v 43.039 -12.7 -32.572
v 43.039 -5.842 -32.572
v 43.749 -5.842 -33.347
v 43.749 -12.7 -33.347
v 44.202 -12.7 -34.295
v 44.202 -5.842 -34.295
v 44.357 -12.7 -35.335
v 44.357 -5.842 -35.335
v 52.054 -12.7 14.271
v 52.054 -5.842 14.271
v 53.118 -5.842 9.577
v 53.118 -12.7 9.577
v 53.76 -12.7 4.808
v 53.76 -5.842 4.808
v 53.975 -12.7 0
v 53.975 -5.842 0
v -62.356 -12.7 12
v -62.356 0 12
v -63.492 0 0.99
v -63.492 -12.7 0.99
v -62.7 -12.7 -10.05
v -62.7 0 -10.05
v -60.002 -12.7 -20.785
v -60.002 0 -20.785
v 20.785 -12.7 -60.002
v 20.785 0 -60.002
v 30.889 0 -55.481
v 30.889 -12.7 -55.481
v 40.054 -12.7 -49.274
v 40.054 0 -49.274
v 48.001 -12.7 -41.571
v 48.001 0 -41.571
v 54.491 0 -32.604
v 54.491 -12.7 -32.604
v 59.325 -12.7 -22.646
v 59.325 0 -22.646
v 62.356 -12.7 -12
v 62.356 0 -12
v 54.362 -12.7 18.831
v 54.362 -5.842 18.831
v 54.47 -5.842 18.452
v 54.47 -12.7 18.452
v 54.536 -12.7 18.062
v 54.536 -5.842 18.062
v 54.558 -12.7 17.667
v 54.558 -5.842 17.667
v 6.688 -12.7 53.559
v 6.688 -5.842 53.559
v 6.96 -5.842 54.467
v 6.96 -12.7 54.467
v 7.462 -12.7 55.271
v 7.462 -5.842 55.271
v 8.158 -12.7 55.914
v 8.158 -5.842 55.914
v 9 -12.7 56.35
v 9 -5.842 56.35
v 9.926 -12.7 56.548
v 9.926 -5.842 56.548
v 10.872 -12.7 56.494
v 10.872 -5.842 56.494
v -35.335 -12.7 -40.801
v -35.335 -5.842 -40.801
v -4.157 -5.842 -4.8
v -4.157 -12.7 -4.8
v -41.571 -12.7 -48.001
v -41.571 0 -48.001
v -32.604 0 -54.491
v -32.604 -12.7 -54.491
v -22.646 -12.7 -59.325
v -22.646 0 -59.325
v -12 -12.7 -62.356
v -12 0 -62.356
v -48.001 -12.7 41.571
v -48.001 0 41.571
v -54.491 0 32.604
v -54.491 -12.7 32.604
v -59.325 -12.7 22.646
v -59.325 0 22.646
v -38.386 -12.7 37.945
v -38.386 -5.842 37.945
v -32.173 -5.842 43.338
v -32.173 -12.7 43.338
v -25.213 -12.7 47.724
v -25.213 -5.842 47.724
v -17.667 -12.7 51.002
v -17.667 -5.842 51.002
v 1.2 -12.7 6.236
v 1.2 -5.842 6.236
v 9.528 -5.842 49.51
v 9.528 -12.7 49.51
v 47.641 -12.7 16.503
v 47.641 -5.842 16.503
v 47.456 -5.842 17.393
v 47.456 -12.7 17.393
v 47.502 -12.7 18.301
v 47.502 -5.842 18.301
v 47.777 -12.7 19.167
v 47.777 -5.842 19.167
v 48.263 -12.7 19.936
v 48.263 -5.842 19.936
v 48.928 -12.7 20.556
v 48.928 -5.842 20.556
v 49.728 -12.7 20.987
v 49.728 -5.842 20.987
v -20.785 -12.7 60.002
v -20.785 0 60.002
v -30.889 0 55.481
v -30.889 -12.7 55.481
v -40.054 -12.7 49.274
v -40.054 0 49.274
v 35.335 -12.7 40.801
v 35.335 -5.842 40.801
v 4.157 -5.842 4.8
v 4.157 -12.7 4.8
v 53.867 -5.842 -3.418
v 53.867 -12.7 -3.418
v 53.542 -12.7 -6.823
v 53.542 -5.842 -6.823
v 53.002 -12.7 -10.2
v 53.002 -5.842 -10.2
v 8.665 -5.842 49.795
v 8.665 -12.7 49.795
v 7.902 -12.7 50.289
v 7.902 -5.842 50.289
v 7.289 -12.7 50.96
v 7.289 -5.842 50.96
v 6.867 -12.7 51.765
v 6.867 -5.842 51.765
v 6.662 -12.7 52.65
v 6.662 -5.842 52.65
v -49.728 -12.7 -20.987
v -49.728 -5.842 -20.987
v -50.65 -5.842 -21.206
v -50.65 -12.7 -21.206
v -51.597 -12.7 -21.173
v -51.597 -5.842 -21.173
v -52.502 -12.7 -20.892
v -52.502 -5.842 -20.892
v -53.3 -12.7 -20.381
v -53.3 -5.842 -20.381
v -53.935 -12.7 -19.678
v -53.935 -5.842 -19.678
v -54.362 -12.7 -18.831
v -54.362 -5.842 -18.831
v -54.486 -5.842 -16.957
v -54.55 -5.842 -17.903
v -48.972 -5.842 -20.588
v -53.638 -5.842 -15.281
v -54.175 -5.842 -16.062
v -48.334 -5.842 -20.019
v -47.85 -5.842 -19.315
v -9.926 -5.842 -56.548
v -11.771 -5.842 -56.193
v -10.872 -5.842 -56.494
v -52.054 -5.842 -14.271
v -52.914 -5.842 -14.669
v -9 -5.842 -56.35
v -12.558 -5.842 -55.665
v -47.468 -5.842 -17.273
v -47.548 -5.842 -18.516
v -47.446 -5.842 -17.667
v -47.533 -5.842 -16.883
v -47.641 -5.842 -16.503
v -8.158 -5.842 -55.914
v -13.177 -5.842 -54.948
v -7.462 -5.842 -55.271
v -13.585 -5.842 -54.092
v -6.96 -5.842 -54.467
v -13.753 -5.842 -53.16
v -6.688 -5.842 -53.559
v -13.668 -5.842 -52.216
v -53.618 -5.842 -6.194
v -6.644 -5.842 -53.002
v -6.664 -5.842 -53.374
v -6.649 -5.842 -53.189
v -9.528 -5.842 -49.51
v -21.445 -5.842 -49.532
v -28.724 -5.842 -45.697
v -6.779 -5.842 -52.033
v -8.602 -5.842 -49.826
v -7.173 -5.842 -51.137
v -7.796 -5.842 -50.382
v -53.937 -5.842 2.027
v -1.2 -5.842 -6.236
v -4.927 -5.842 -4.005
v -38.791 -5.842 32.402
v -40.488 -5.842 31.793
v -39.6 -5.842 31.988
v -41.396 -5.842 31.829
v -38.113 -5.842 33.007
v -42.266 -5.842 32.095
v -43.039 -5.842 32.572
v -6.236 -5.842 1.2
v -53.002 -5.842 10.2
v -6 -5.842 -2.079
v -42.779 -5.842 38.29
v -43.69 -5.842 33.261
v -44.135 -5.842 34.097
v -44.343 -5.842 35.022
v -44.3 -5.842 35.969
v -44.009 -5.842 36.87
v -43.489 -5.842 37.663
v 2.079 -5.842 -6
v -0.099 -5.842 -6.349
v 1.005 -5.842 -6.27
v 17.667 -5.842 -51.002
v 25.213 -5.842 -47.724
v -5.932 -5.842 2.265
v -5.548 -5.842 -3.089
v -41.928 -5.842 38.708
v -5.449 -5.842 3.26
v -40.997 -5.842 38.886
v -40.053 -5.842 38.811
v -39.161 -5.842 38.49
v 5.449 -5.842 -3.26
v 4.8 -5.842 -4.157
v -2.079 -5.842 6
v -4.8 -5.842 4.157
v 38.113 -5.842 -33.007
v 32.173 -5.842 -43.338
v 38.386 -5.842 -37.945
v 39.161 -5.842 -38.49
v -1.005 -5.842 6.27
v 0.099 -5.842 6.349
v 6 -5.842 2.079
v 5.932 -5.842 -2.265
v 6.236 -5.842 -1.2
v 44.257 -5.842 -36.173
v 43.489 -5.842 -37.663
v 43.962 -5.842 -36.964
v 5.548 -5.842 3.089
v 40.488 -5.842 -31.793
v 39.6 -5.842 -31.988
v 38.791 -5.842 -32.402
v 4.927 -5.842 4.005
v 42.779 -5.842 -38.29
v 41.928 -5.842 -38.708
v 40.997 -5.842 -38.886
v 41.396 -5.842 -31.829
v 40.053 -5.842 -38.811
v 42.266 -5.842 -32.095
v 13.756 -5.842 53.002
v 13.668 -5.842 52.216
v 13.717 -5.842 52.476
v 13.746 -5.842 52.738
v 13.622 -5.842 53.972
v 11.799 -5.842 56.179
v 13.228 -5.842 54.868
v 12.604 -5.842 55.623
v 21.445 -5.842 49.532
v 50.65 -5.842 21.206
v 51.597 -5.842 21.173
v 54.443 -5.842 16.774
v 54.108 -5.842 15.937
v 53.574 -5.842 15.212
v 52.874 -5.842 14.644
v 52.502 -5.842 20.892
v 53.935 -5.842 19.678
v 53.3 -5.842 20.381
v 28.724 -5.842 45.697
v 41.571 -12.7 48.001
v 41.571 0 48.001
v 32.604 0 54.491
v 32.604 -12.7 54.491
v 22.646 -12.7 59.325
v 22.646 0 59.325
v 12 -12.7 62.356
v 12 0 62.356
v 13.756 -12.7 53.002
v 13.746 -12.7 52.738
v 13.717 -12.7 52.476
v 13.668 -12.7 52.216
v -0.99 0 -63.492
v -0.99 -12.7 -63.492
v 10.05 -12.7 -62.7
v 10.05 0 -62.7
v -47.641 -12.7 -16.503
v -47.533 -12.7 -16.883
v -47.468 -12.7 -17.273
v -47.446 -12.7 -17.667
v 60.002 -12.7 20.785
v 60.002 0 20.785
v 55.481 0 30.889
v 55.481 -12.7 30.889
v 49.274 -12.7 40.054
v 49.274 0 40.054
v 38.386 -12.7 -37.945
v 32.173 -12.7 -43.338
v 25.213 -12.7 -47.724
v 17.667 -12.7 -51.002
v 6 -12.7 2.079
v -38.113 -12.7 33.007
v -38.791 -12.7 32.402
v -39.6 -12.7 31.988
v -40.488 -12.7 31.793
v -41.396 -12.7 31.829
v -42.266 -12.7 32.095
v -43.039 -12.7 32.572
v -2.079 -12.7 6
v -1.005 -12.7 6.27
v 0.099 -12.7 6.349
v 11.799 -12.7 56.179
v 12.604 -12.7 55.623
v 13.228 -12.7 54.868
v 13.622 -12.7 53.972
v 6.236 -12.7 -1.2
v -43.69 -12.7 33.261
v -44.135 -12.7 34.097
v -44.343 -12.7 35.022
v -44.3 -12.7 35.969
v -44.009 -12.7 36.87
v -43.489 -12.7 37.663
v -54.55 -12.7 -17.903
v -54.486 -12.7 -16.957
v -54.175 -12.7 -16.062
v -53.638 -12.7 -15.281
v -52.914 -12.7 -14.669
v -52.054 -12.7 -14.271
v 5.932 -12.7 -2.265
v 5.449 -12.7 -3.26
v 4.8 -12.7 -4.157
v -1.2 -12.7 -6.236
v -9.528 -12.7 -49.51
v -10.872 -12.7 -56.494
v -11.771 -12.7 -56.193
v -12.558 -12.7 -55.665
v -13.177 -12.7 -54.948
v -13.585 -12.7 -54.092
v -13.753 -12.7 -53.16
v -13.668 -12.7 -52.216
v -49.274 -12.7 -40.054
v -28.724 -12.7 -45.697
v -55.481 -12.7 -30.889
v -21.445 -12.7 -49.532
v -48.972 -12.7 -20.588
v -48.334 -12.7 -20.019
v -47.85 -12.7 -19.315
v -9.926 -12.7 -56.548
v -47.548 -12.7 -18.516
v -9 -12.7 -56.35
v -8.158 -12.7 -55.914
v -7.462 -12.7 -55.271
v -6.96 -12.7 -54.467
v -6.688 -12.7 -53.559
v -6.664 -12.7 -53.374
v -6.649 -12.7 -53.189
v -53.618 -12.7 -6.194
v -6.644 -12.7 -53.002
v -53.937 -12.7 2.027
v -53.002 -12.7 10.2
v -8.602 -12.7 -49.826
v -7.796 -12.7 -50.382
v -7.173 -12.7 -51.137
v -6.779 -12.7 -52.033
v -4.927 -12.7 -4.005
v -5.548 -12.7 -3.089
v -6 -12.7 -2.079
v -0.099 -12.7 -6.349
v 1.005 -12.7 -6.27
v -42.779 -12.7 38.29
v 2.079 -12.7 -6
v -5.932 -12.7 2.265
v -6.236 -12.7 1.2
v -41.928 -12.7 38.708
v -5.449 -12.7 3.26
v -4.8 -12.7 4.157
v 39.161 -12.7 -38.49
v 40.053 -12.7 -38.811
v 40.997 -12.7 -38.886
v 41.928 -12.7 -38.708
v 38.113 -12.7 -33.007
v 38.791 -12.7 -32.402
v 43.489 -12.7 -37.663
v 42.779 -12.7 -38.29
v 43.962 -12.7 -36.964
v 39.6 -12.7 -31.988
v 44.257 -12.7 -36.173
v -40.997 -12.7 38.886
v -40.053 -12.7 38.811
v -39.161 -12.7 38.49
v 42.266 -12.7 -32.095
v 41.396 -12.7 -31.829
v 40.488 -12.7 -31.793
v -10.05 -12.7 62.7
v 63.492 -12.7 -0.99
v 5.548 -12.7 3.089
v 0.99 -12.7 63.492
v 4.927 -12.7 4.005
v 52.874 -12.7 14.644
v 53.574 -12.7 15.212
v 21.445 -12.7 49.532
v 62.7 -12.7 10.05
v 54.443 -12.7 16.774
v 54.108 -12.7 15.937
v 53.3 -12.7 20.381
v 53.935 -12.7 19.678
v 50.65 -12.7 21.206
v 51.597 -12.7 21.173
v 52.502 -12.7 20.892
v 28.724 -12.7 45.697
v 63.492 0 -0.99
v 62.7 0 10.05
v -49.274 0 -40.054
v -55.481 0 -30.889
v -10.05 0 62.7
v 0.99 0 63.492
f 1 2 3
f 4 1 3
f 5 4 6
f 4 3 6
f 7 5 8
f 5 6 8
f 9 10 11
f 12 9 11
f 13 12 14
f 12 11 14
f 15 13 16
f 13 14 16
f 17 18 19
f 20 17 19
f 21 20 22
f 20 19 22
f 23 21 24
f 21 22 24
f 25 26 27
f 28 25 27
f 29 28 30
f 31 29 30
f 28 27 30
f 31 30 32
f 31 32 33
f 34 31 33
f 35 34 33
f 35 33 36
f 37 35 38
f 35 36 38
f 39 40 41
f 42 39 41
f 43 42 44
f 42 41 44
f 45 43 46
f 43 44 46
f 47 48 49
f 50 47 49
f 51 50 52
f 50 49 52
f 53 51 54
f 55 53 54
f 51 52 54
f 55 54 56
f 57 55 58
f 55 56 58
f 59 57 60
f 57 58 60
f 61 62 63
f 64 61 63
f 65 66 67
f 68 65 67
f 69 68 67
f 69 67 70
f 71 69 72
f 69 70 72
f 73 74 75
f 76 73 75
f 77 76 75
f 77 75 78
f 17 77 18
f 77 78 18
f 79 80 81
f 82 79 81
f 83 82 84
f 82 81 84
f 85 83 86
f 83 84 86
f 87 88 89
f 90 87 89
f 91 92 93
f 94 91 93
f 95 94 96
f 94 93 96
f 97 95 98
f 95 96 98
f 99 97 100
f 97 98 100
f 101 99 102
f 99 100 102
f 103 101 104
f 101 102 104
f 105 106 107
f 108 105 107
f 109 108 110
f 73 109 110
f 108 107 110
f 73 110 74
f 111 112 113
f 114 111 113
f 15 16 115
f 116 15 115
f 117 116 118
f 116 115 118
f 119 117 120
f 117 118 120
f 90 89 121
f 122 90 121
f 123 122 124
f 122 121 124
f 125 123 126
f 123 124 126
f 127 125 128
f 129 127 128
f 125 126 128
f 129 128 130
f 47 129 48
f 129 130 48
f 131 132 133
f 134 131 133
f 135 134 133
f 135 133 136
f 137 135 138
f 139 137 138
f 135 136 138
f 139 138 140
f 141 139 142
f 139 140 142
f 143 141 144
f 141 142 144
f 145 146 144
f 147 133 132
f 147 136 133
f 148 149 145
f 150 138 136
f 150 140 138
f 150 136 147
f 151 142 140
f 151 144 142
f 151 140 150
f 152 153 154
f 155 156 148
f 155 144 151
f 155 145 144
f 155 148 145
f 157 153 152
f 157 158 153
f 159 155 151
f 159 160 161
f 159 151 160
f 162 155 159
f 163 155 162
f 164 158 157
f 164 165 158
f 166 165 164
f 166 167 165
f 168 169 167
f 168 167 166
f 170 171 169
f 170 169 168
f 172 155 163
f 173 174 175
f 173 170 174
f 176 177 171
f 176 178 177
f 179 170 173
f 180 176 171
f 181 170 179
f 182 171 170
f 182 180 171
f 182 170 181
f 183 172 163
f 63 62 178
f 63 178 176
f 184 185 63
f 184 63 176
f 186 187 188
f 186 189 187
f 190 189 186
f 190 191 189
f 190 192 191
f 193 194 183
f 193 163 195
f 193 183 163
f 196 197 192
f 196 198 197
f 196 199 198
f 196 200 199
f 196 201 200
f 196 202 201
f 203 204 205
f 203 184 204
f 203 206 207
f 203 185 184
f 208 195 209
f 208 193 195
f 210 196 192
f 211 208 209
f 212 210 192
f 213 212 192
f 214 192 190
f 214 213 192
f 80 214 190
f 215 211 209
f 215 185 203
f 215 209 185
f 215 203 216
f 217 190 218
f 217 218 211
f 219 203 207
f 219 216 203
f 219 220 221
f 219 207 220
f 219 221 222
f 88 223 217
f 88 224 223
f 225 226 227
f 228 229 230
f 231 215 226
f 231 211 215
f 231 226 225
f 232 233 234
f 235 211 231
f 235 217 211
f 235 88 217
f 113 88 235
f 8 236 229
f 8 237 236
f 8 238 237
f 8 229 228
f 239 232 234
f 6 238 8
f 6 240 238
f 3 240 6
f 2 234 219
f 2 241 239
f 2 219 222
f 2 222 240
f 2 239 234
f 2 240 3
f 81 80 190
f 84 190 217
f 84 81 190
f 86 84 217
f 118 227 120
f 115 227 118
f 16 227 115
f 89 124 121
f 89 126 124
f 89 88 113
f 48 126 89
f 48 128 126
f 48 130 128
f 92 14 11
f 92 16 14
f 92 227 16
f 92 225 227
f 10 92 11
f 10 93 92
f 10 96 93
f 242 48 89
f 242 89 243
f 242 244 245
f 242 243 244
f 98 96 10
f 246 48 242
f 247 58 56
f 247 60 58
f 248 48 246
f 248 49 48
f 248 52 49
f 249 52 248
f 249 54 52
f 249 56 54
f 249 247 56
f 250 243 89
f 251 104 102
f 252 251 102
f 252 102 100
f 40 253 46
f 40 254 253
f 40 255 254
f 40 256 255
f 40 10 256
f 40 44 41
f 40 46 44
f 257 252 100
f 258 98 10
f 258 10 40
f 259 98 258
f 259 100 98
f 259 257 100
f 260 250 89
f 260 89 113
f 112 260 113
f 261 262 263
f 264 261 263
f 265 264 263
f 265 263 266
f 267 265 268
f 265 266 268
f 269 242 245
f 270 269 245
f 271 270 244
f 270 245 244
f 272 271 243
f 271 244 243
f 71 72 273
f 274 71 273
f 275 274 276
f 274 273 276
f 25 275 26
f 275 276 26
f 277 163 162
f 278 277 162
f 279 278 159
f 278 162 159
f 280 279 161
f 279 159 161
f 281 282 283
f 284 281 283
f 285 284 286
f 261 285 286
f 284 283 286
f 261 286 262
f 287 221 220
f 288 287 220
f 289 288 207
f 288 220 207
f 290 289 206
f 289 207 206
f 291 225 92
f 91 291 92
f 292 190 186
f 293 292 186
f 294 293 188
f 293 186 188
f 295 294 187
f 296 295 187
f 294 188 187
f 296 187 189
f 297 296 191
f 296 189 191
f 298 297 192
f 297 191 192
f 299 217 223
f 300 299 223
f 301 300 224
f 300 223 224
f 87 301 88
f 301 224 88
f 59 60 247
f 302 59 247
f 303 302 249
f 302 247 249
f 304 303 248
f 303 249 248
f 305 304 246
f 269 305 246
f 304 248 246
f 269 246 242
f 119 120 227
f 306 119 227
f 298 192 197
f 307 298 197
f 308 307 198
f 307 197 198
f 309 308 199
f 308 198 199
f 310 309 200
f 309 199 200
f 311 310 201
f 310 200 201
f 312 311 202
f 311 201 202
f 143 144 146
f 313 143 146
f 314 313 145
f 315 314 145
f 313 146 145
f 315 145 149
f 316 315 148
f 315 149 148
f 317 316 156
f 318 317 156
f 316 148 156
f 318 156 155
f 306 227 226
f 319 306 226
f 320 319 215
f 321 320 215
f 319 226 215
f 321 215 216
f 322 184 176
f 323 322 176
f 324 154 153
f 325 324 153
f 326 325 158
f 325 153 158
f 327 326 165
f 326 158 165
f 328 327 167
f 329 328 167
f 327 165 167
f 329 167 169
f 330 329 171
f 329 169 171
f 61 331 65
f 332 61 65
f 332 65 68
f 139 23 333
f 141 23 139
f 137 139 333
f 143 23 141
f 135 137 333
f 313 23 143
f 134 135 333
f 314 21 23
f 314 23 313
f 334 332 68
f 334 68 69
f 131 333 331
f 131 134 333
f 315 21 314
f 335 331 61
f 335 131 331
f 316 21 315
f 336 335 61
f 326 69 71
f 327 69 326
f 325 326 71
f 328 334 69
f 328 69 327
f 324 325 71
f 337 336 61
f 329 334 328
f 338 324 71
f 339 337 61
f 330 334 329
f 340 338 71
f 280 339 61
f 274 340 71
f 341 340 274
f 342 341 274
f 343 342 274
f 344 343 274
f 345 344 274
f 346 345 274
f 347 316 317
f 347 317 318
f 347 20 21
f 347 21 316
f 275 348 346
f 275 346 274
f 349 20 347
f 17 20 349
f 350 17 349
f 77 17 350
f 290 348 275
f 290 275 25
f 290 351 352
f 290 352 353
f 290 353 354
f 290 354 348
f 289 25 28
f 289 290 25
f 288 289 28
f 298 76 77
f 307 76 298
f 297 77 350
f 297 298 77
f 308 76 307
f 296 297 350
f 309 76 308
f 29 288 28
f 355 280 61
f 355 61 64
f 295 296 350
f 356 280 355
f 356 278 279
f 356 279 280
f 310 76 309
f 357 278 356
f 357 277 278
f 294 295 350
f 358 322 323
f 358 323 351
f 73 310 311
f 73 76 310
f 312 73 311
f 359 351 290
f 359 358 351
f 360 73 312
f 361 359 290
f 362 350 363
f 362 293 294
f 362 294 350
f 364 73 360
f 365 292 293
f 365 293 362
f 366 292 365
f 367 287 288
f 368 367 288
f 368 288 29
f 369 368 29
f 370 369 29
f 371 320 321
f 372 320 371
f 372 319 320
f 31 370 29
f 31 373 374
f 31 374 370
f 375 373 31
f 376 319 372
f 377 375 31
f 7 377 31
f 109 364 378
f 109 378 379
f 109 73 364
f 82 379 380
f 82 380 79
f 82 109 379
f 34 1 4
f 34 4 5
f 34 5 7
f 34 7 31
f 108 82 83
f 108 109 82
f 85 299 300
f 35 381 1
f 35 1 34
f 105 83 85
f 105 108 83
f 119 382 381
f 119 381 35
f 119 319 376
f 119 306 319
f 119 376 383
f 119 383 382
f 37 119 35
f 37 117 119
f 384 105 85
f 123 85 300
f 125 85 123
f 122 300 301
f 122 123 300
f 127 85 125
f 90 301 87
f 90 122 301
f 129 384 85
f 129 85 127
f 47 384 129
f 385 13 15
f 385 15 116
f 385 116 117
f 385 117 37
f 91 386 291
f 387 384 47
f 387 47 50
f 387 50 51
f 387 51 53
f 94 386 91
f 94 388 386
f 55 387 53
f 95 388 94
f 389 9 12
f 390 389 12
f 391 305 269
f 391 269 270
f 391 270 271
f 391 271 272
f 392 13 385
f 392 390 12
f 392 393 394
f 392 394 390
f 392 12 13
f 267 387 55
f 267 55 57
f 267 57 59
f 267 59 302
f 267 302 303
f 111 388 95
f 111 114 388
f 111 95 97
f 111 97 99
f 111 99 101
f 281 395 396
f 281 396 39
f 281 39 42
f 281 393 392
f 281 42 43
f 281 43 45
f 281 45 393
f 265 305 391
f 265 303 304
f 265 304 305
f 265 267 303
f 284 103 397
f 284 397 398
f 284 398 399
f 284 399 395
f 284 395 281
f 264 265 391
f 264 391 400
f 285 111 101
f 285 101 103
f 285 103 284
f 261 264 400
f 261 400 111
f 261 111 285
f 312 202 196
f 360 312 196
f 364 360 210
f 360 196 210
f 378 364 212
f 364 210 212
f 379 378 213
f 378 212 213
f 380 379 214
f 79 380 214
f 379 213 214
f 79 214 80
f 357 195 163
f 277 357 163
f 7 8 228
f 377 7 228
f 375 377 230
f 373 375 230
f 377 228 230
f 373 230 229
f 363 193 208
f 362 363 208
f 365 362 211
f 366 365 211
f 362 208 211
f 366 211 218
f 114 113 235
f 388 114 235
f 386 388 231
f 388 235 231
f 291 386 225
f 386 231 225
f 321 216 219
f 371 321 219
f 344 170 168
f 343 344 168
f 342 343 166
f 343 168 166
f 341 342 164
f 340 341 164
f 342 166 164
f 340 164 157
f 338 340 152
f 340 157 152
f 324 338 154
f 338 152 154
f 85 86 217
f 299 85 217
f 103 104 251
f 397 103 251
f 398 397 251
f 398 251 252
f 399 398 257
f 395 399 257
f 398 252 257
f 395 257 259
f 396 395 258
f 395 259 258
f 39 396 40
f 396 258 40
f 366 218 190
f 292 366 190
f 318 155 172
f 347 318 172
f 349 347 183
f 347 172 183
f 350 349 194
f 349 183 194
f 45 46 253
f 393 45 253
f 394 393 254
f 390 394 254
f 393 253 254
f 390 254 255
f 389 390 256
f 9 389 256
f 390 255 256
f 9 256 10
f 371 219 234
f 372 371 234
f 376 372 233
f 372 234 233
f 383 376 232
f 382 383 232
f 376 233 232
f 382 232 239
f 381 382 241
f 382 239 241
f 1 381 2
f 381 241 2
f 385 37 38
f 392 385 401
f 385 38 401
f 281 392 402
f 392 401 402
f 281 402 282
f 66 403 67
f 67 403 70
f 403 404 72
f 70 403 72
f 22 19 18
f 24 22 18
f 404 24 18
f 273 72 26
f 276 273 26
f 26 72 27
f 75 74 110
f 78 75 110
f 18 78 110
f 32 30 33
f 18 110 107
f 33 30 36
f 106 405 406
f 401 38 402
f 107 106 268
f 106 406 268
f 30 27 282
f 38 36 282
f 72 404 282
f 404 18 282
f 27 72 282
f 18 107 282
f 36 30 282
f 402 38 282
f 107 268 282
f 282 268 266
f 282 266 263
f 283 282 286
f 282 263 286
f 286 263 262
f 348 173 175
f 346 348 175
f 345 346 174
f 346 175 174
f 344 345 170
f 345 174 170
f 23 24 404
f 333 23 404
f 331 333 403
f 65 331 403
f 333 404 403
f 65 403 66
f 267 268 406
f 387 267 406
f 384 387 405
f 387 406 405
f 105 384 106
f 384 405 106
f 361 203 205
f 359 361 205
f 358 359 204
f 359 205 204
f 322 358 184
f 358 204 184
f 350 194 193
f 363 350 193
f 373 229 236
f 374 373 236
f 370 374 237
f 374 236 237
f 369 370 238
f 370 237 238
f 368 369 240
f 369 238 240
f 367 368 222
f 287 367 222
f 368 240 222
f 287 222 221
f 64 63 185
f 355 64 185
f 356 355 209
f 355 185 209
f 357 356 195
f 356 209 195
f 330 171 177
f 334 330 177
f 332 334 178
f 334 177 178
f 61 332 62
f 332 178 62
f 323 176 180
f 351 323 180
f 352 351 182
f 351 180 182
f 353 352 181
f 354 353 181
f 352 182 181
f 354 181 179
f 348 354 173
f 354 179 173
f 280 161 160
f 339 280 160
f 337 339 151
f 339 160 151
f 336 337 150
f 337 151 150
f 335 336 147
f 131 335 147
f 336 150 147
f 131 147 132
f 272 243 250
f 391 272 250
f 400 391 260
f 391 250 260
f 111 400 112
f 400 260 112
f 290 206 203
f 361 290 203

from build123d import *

# Parameters (mm, degrees)
F1_DEPTH = 12.7
F2_R     = 63.5
F3_DEPTH = 5.842


# Not quite as in the source:
# - a feature names something its author has since deleted; it is built from what else it names


with BuildPart() as f1:
    # F0 (on Front) → F1 (new body)
    with BuildSketch(Plane.XZ):
        with BuildLine():
            Line((54.3616852417, 18.8314401648), (60.0018600902, 20.785254045))
            ThreePointArc((60.0018600902, 20.785254045), (52.5777266824, 35.6066378209), (41.57050809, 48.0014880722))
            Line((41.57050809, 48.0014880722), (35.3349318765, 40.8012648613))
            ThreePointArc((35.3349318765, 40.8012648613), (43.6698276291, 31.7213930943), (49.7275527638, 20.9874038681))
            ThreePointArc((49.7275527638, 20.9874038681), (52.5015720726, 20.8916190072), (54.3616852417, 18.8314401648))
        make_face()
        with BuildLine():
            Line((35.3349318765, 40.8012648613), (41.57050809, 48.0014880722))
            ThreePointArc((41.57050809, 48.0014880722), (27.7303280697, 57.1251162375), (12.000372018, 62.3557621349))
            Line((12.000372018, 62.3557621349), (10.8723370483, 56.4943204943))
            ThreePointArc((10.8723370483, 56.4943204943), (12.9421077904, 55.2668436539), (13.7563162153, 53.0023978147))
            ThreePointArc((13.7563162153, 53.0023978147), (13.7342201731, 52.6065963274), (13.6682066443, 52.2157136514))
            ThreePointArc((13.6682066443, 52.2157136514), (25.1574900679, 47.7535477057), (35.3349318765, 40.8012648613))
        make_face()
        with BuildLine():
            Line((10.8723370483, 56.4943204943), (12.000372018, 62.3557621349))
            ThreePointArc((12.000372018, 62.3557621349), (-4.5473895551, 63.3369658907), (-20.785254045, 60.0018600902))
            Line((-20.785254045, 60.0018600902), (-17.6674659382, 51.0015810767))
            ThreePointArc((-17.6674659382, 51.0015810767), (-5.6366184485, 53.6798766529), (6.6881514727, 53.5590258955))
            ThreePointArc((6.6881514727, 53.5590258955), (8.1581132499, 55.9135046571), (10.8723370483, 56.4943204943))
        make_face()
        with BuildLine():
            Line((-17.6674659382, 51.0015810767), (-20.785254045, 60.0018600902))
            ThreePointArc((-20.785254045, 60.0018600902), (-35.6066378209, 52.5777266824), (-48.0014880722, 41.57050809))
            Line((-48.0014880722, 41.57050809), (-43.4893481934, 37.6628803295))
            ThreePointArc((-43.4893481934, 37.6628803295), (-40.9974571589, 38.8855155725), (-38.3860311767, 37.9448710039))
            ThreePointArc((-38.3860311767, 37.9448710039), (-28.7770404, 45.6637993471), (-17.6674659382, 51.0015810767))
        make_face()
        with BuildLine():
            Line((-43.4893481934, 37.6628803295), (-48.0014880722, 41.57050809))
            ThreePointArc((-48.0014880722, 41.57050809), (-57.1251162375, 27.7303280697), (-62.3557621349, 12.000372018))
            Line((-62.3557621349, 12.000372018), (-53.0023978147, 10.2003162153))
            ThreePointArc((-53.0023978147, 10.2003162153), (-49.3064460776, 21.9584835586), (-43.0394012911, 32.5716220275))
            ThreePointArc((-43.0394012911, 32.5716220275), (-44.3434588227, 35.0218856499), (-43.4893481934, 37.6628803295))
        make_face()
        with BuildLine():
            Line((-53.0023978147, 10.2003162153), (-62.3557621349, 12.000372018))
            ThreePointArc((-62.3557621349, 12.000372018), (-63.3369658907, -4.5473895551), (-60.0018600902, -20.785254045))
            Line((-60.0018600902, -20.785254045), (-54.3616852417, -18.8314401648))
            ThreePointArc((-54.3616852417, -18.8314401648), (-54.1745729045, -16.062081604), (-52.054237821, -14.2708426476))
            ThreePointArc((-52.054237821, -14.2708426476), (-53.9345304679, -2.0897483586), (-53.0023978147, 10.2003162153))
        make_face()
        with BuildLine():
            ThreePointArc((-60.0018600902, -20.785254045), (-52.5777266824, -35.6066378209), (-41.57050809, -48.0014880722))
            Line((-41.57050809, -48.0014880722), (-35.3349318765, -40.8012648613))
            ThreePointArc((-35.3349318765, -40.8012648613), (-43.6698276292, -31.7213930943), (-49.7275527638, -20.9874038681))
            ThreePointArc((-49.7275527638, -20.9874038681), (-52.5015720726, -20.8916190072), (-54.3616852417, -18.8314401648))
            Line((-54.3616852417, -18.8314401648), (-60.0018600902, -20.785254045))
        make_face()
        with BuildLine():
            ThreePointArc((-41.57050809, -48.0014880722), (-27.7303280697, -57.1251162375), (-12.000372018, -62.3557621349))
            Line((-12.000372018, -62.3557621349), (-10.8723370483, -56.4943204943))
            ThreePointArc((-10.8723370483, -56.4943204943), (-13.1771157456, -54.9475971764), (-13.6682066443, -52.2157136514))
            ThreePointArc((-13.6682066443, -52.2157136514), (-25.1574900679, -47.7535477057), (-35.3349318765, -40.8012648613))
            Line((-35.3349318765, -40.8012648613), (-41.57050809, -48.0014880722))
        make_face()
        with BuildLine():
            ThreePointArc((-12.000372018, -62.3557621349), (4.5473895551, -63.3369658907), (20.785254045, -60.0018600902))
            Line((20.785254045, -60.0018600902), (17.6674659382, -51.0015810767))
            ThreePointArc((17.6674659382, -51.0015810767), (5.6366184485, -53.6798766529), (-6.6881514727, -53.5590258955))
            ThreePointArc((-6.6881514727, -53.5590258955), (-8.1581132499, -55.9135046571), (-10.8723370483, -56.4943204943))
            Line((-10.8723370483, -56.4943204943), (-12.000372018, -62.3557621349))
        make_face()
        with BuildLine():
            ThreePointArc((20.785254045, -60.0018600902), (35.6066378209, -52.5777266824), (48.0014880722, -41.57050809))
            Line((48.0014880722, -41.57050809), (43.4893481934, -37.6628803295))
            ThreePointArc((43.4893481934, -37.6628803295), (40.9974571589, -38.8855155725), (38.3860311767, -37.9448710039))
            ThreePointArc((38.3860311767, -37.9448710039), (28.7770404, -45.6637993471), (17.6674659382, -51.0015810767))
            Line((17.6674659382, -51.0015810767), (20.785254045, -60.0018600902))
        make_face()
        with BuildLine():
            ThreePointArc((48.0014880722, -41.57050809), (57.1251162375, -27.7303280697), (62.3557621349, -12.000372018))
            Line((62.3557621349, -12.000372018), (53.0023978147, -10.2003162153))
            ThreePointArc((53.0023978147, -10.2003162153), (49.3064460776, -21.9584835586), (43.0394012911, -32.5716220275))
            ThreePointArc((43.0394012911, -32.5716220275), (44.0109337807, -33.8041930262), (44.3572648613, -35.3349318765))
            ThreePointArc((44.3572648613, -35.3349318765), (44.1332282712, -36.5771701127), (43.4893481934, -37.6628803295))
            Line((43.4893481934, -37.6628803295), (48.0014880722, -41.57050809))
        make_face()
        with BuildLine():
            ThreePointArc((62.3557621349, -12.000372018), (63.2132932838, -6.0274001208), (63.5, 0))
            ThreePointArc((63.5, 0), (62.6193584913, 10.5387827635), (60.0018600902, 20.785254045))
            Line((60.0018600902, 20.785254045), (54.3616852417, 18.8314401648))
            ThreePointArc((54.3616852417, 18.8314401648), (54.5082651522, 18.257637773), (54.5575810767, 17.6674659382))
            ThreePointArc((54.5575810767, 17.6674659382), (53.864130935, 15.5577398165), (52.054237821, 14.2708426476))
            ThreePointArc((52.054237821, 14.2708426476), (53.4926542218, 7.1997617534), (53.975, 0))
            ThreePointArc((53.975, 0), (53.7312992912, -5.1232901027), (53.0023978147, -10.2003162153))
            Line((53.0023978147, -10.2003162153), (62.3557621349, -12.000372018))
        make_face()
        with BuildLine():
            ThreePointArc((-6.2355762135, 1.2000372018), (-5.7125116237, 2.773032807), (-4.8001488072, 4.157050809))
            Line((-4.8001488072, 4.157050809), (-38.1131815293, 33.0069834234))
            ThreePointArc((-38.1131815293, 33.0069834234), (-40.4882186348, 31.7927379151), (-43.0394012911, 32.5716220275))
            ThreePointArc((-43.0394012911, 32.5716220275), (-49.3064460776, 21.9584835586), (-53.0023978147, 10.2003162153))
            Line((-53.0023978147, 10.2003162153), (-6.2355762135, 1.2000372018))
        make_face()
        with BuildLine():
            ThreePointArc((-6.6881514727, -53.5590258955), (5.6366184485, -53.6798766529), (17.6674659382, -51.0015810767))
            Line((17.6674659382, -51.0015810767), (2.0785254045, -6.000186009))
            ThreePointArc((2.0785254045, -6.000186009), (0.4547389555, -6.3336965891), (-1.2000372018, -6.2355762135))
            Line((-1.2000372018, -6.2355762135), (-9.5282953823, -49.5104751351))
            ThreePointArc((-9.5282953823, -49.5104751351), (-7.4585246403, -50.7379519754), (-6.6443162153, -53.0023978147))
            ThreePointArc((-6.6443162153, -53.0023978147), (-6.6552919682, -53.2815735435), (-6.6881514727, -53.5590258955))
        make_face()
        with BuildLine():
            Line((-35.3349318765, -40.8012648613), (-4.157050809, -4.8001488072))
            ThreePointArc((-4.157050809, -4.8001488072), (-5.2577726682, -3.5606637821), (-6.000186009, -2.0785254045))
            Line((-6.000186009, -2.0785254045), (-47.6414769116, -16.5034917117))
            ThreePointArc((-47.6414769116, -16.5034917117), (-47.4948970012, -17.0772941035), (-47.4455810767, -17.6674659382))
            ThreePointArc((-47.4455810767, -17.6674659382), (-48.0710878861, -19.681751335), (-49.7275527638, -20.9874038681))
            ThreePointArc((-49.7275527638, -20.9874038681), (-43.6698276292, -31.7213930943), (-35.3349318765, -40.8012648613))
        make_face()
        with BuildLine():
            ThreePointArc((6.6881514727, 53.5590258955), (-5.6366184485, 53.6798766529), (-17.6674659382, 51.0015810767))
            Line((-17.6674659382, 51.0015810767), (-2.0785254045, 6.000186009))
            ThreePointArc((-2.0785254045, 6.000186009), (-0.4547389555, 6.3336965891), (1.2000372018, 6.2355762135))
            Line((1.2000372018, 6.2355762135), (9.5282953823, 49.5104751351))
            ThreePointArc((9.5282953823, 49.5104751351), (7.2892093729, 50.9601948492), (6.6881514727, 53.5590258955))
        make_face()
        with BuildLine():
            ThreePointArc((43.0394012911, -32.5716220275), (49.3064460776, -21.9584835586), (53.0023978147, -10.2003162153))
            Line((53.0023978147, -10.2003162153), (6.2355762135, -1.2000372018))
            ThreePointArc((6.2355762135, -1.2000372018), (5.7125116237, -2.773032807), (4.8001488072, -4.157050809))
            Line((4.8001488072, -4.157050809), (38.1131815293, -33.0069834234))
            ThreePointArc((38.1131815293, -33.0069834234), (40.4882186348, -31.7927379151), (43.0394012911, -32.5716220275))
        make_face()
        with BuildLine():
            ThreePointArc((49.7275527638, 20.9874038681), (43.6698276291, 31.7213930943), (35.3349318765, 40.8012648613))
            Line((35.3349318765, 40.8012648613), (4.157050809, 4.8001488072))
            ThreePointArc((4.157050809, 4.8001488072), (5.2577726682, 3.5606637821), (6.000186009, 2.0785254045))
            Line((6.000186009, 2.0785254045), (47.6414769116, 16.5034917117))
            ThreePointArc((47.6414769116, 16.5034917117), (47.7774280077, 19.1674569341), (49.7275527638, 20.9874038681))
        make_face()
    extrude(amount=F1_DEPTH)

    # F2 (on Front) → F3 (join)
    with BuildSketch(Plane.XZ):
        Circle(F2_R)
    extrude(amount=F3_DEPTH)


solid = f1.part
